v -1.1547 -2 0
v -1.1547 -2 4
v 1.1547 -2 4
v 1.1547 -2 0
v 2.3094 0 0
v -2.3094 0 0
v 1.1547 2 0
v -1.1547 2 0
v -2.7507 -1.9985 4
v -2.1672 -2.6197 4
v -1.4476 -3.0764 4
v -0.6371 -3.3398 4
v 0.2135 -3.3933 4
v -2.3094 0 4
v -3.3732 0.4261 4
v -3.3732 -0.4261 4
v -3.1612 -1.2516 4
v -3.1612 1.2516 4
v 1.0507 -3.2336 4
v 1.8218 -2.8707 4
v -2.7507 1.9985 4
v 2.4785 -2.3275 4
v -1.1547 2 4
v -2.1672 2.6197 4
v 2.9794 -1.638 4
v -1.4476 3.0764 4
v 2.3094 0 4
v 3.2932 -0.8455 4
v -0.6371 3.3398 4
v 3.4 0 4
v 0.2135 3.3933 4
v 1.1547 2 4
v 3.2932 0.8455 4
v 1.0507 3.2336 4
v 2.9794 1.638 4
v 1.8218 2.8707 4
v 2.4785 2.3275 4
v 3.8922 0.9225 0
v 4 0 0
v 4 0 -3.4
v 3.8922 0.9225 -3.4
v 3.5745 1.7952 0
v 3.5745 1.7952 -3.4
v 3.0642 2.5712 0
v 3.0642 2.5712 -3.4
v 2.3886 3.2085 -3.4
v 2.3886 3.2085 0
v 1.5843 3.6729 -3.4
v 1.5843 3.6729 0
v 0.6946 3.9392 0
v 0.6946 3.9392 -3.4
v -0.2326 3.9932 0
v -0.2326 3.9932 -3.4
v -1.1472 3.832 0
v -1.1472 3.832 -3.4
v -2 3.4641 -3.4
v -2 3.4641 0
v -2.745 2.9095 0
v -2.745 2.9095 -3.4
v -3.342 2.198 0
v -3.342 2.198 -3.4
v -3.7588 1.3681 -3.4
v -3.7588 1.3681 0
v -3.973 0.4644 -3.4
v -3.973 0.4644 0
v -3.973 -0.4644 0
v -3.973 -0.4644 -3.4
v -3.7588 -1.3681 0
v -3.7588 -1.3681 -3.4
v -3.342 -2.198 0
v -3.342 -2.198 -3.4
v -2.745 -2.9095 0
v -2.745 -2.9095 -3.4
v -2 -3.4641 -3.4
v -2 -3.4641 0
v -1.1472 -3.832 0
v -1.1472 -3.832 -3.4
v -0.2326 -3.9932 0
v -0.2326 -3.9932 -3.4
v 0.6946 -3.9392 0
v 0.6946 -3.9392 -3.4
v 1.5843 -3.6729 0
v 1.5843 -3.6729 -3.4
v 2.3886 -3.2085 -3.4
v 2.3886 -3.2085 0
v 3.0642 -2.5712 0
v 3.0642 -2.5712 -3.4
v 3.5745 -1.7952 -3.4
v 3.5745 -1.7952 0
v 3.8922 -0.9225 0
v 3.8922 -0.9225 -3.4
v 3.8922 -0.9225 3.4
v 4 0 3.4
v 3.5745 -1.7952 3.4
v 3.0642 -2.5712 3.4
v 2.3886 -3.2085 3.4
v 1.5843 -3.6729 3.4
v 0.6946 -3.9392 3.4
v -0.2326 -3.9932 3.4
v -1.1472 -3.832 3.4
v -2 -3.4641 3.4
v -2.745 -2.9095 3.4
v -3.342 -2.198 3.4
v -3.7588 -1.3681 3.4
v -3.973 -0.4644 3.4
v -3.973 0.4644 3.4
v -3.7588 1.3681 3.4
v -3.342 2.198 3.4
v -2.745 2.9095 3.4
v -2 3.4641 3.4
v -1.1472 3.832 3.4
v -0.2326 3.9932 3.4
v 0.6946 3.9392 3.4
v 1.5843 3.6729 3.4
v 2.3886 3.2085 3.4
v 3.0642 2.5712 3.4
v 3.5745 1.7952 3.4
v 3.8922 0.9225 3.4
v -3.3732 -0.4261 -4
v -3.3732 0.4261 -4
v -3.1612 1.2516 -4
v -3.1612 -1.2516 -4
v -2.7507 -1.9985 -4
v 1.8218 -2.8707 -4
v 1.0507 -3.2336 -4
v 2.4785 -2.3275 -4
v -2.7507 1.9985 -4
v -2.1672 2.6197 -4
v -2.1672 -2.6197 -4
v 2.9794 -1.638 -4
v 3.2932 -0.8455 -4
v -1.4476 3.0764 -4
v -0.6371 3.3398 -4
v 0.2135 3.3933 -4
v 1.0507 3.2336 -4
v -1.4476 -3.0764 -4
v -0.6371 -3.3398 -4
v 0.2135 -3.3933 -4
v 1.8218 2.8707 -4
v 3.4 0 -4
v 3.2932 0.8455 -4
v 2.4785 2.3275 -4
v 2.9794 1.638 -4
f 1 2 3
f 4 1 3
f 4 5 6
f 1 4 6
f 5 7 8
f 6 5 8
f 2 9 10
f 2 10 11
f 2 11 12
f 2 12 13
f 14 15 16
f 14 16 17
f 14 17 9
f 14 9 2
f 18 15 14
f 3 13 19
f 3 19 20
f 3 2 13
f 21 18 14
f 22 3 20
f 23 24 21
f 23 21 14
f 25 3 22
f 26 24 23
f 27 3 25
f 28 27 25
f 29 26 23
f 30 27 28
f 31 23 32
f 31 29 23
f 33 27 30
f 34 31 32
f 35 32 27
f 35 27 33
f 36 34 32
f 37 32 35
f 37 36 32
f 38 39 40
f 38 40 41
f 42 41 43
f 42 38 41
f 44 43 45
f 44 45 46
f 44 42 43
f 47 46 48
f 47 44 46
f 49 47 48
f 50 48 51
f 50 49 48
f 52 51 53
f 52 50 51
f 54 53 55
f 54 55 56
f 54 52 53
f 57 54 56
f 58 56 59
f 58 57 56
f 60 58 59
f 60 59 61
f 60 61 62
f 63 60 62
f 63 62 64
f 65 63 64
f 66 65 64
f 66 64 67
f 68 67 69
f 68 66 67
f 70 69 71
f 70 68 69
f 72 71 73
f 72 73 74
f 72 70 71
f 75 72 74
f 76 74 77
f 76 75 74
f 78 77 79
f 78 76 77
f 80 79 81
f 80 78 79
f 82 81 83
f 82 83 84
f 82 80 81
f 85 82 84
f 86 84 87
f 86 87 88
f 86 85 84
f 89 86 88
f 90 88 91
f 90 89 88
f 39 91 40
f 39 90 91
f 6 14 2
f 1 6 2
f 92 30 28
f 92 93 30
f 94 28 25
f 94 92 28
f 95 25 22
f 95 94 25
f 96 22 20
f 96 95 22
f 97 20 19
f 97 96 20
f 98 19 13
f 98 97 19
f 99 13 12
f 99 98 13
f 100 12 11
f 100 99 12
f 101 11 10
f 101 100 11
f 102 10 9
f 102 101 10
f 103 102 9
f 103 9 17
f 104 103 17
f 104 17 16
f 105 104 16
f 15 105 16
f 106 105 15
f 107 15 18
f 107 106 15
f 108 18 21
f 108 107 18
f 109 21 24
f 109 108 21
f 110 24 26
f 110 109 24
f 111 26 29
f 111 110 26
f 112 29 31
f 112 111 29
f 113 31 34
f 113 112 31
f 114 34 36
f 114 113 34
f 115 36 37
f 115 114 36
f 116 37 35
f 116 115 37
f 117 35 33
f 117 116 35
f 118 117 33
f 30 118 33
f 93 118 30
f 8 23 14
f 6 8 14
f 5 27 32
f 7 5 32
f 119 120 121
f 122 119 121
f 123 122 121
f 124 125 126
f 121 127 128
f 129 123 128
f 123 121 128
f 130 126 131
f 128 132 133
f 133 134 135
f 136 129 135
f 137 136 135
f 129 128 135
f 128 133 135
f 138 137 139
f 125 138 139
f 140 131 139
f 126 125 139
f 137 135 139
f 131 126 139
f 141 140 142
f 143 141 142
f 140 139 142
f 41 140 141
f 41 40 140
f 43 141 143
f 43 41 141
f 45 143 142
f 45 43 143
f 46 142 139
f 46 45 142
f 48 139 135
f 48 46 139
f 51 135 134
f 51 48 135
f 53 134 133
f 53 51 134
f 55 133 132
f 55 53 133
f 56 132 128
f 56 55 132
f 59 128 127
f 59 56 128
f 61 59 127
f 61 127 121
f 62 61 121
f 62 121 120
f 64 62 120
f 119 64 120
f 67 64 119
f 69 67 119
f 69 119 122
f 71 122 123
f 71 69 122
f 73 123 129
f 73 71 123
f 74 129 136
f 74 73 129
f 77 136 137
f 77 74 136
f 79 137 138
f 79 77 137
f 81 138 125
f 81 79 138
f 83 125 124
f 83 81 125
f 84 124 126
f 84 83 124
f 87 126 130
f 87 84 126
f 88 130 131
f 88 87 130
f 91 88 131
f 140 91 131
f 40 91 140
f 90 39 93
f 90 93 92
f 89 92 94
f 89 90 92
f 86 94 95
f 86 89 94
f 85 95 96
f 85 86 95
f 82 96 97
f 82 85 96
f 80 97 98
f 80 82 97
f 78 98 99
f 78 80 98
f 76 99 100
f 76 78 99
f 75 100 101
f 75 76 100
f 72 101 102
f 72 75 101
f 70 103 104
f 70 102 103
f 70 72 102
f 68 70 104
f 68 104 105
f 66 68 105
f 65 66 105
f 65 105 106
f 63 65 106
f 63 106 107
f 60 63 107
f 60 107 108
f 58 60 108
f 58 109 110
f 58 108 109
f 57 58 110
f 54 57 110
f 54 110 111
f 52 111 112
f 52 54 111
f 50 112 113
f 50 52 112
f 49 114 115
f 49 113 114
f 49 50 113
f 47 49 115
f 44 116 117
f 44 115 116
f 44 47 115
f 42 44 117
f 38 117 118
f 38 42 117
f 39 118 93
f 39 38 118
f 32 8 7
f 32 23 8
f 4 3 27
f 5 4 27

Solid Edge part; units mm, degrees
sketch "Sketch1" plane through (0, 0, 0) normal (0, 0, 1) x (1, 0, 0)
  circle A0 centre (0, 0) radius 4
  dimension "D1" = 8
extrude "Protrusion1" add sketch "Sketch1" along normal mid plane 8
chamfer "Chamfer1" distance 0.6 angle 45 2 edges at (-4, 0, -4) (-4, 0, 4)
sketch "Sketch2" plane through (0, 0, 4) normal (0, 0, 1) x (1, 0, 0)
  line L0 (-1.1547, 2) -> (1.1547, 2)
  line L1 (2.3094, 0) -> (1.1547, 2)
  line L2 (1.1547, -2) -> (2.3094, 0)
  line L3 (-1.1547, -2) -> (1.1547, -2)
  line L4 (-2.3094, 0) -> (-1.1547, -2)
  line L5 (-1.1547, 2) -> (-2.3094, 0)
  dimension "D1" = 4
extrude "Cutout1" cut sketch "Sketch2" against normal blind 4
properties part number "24104459"
